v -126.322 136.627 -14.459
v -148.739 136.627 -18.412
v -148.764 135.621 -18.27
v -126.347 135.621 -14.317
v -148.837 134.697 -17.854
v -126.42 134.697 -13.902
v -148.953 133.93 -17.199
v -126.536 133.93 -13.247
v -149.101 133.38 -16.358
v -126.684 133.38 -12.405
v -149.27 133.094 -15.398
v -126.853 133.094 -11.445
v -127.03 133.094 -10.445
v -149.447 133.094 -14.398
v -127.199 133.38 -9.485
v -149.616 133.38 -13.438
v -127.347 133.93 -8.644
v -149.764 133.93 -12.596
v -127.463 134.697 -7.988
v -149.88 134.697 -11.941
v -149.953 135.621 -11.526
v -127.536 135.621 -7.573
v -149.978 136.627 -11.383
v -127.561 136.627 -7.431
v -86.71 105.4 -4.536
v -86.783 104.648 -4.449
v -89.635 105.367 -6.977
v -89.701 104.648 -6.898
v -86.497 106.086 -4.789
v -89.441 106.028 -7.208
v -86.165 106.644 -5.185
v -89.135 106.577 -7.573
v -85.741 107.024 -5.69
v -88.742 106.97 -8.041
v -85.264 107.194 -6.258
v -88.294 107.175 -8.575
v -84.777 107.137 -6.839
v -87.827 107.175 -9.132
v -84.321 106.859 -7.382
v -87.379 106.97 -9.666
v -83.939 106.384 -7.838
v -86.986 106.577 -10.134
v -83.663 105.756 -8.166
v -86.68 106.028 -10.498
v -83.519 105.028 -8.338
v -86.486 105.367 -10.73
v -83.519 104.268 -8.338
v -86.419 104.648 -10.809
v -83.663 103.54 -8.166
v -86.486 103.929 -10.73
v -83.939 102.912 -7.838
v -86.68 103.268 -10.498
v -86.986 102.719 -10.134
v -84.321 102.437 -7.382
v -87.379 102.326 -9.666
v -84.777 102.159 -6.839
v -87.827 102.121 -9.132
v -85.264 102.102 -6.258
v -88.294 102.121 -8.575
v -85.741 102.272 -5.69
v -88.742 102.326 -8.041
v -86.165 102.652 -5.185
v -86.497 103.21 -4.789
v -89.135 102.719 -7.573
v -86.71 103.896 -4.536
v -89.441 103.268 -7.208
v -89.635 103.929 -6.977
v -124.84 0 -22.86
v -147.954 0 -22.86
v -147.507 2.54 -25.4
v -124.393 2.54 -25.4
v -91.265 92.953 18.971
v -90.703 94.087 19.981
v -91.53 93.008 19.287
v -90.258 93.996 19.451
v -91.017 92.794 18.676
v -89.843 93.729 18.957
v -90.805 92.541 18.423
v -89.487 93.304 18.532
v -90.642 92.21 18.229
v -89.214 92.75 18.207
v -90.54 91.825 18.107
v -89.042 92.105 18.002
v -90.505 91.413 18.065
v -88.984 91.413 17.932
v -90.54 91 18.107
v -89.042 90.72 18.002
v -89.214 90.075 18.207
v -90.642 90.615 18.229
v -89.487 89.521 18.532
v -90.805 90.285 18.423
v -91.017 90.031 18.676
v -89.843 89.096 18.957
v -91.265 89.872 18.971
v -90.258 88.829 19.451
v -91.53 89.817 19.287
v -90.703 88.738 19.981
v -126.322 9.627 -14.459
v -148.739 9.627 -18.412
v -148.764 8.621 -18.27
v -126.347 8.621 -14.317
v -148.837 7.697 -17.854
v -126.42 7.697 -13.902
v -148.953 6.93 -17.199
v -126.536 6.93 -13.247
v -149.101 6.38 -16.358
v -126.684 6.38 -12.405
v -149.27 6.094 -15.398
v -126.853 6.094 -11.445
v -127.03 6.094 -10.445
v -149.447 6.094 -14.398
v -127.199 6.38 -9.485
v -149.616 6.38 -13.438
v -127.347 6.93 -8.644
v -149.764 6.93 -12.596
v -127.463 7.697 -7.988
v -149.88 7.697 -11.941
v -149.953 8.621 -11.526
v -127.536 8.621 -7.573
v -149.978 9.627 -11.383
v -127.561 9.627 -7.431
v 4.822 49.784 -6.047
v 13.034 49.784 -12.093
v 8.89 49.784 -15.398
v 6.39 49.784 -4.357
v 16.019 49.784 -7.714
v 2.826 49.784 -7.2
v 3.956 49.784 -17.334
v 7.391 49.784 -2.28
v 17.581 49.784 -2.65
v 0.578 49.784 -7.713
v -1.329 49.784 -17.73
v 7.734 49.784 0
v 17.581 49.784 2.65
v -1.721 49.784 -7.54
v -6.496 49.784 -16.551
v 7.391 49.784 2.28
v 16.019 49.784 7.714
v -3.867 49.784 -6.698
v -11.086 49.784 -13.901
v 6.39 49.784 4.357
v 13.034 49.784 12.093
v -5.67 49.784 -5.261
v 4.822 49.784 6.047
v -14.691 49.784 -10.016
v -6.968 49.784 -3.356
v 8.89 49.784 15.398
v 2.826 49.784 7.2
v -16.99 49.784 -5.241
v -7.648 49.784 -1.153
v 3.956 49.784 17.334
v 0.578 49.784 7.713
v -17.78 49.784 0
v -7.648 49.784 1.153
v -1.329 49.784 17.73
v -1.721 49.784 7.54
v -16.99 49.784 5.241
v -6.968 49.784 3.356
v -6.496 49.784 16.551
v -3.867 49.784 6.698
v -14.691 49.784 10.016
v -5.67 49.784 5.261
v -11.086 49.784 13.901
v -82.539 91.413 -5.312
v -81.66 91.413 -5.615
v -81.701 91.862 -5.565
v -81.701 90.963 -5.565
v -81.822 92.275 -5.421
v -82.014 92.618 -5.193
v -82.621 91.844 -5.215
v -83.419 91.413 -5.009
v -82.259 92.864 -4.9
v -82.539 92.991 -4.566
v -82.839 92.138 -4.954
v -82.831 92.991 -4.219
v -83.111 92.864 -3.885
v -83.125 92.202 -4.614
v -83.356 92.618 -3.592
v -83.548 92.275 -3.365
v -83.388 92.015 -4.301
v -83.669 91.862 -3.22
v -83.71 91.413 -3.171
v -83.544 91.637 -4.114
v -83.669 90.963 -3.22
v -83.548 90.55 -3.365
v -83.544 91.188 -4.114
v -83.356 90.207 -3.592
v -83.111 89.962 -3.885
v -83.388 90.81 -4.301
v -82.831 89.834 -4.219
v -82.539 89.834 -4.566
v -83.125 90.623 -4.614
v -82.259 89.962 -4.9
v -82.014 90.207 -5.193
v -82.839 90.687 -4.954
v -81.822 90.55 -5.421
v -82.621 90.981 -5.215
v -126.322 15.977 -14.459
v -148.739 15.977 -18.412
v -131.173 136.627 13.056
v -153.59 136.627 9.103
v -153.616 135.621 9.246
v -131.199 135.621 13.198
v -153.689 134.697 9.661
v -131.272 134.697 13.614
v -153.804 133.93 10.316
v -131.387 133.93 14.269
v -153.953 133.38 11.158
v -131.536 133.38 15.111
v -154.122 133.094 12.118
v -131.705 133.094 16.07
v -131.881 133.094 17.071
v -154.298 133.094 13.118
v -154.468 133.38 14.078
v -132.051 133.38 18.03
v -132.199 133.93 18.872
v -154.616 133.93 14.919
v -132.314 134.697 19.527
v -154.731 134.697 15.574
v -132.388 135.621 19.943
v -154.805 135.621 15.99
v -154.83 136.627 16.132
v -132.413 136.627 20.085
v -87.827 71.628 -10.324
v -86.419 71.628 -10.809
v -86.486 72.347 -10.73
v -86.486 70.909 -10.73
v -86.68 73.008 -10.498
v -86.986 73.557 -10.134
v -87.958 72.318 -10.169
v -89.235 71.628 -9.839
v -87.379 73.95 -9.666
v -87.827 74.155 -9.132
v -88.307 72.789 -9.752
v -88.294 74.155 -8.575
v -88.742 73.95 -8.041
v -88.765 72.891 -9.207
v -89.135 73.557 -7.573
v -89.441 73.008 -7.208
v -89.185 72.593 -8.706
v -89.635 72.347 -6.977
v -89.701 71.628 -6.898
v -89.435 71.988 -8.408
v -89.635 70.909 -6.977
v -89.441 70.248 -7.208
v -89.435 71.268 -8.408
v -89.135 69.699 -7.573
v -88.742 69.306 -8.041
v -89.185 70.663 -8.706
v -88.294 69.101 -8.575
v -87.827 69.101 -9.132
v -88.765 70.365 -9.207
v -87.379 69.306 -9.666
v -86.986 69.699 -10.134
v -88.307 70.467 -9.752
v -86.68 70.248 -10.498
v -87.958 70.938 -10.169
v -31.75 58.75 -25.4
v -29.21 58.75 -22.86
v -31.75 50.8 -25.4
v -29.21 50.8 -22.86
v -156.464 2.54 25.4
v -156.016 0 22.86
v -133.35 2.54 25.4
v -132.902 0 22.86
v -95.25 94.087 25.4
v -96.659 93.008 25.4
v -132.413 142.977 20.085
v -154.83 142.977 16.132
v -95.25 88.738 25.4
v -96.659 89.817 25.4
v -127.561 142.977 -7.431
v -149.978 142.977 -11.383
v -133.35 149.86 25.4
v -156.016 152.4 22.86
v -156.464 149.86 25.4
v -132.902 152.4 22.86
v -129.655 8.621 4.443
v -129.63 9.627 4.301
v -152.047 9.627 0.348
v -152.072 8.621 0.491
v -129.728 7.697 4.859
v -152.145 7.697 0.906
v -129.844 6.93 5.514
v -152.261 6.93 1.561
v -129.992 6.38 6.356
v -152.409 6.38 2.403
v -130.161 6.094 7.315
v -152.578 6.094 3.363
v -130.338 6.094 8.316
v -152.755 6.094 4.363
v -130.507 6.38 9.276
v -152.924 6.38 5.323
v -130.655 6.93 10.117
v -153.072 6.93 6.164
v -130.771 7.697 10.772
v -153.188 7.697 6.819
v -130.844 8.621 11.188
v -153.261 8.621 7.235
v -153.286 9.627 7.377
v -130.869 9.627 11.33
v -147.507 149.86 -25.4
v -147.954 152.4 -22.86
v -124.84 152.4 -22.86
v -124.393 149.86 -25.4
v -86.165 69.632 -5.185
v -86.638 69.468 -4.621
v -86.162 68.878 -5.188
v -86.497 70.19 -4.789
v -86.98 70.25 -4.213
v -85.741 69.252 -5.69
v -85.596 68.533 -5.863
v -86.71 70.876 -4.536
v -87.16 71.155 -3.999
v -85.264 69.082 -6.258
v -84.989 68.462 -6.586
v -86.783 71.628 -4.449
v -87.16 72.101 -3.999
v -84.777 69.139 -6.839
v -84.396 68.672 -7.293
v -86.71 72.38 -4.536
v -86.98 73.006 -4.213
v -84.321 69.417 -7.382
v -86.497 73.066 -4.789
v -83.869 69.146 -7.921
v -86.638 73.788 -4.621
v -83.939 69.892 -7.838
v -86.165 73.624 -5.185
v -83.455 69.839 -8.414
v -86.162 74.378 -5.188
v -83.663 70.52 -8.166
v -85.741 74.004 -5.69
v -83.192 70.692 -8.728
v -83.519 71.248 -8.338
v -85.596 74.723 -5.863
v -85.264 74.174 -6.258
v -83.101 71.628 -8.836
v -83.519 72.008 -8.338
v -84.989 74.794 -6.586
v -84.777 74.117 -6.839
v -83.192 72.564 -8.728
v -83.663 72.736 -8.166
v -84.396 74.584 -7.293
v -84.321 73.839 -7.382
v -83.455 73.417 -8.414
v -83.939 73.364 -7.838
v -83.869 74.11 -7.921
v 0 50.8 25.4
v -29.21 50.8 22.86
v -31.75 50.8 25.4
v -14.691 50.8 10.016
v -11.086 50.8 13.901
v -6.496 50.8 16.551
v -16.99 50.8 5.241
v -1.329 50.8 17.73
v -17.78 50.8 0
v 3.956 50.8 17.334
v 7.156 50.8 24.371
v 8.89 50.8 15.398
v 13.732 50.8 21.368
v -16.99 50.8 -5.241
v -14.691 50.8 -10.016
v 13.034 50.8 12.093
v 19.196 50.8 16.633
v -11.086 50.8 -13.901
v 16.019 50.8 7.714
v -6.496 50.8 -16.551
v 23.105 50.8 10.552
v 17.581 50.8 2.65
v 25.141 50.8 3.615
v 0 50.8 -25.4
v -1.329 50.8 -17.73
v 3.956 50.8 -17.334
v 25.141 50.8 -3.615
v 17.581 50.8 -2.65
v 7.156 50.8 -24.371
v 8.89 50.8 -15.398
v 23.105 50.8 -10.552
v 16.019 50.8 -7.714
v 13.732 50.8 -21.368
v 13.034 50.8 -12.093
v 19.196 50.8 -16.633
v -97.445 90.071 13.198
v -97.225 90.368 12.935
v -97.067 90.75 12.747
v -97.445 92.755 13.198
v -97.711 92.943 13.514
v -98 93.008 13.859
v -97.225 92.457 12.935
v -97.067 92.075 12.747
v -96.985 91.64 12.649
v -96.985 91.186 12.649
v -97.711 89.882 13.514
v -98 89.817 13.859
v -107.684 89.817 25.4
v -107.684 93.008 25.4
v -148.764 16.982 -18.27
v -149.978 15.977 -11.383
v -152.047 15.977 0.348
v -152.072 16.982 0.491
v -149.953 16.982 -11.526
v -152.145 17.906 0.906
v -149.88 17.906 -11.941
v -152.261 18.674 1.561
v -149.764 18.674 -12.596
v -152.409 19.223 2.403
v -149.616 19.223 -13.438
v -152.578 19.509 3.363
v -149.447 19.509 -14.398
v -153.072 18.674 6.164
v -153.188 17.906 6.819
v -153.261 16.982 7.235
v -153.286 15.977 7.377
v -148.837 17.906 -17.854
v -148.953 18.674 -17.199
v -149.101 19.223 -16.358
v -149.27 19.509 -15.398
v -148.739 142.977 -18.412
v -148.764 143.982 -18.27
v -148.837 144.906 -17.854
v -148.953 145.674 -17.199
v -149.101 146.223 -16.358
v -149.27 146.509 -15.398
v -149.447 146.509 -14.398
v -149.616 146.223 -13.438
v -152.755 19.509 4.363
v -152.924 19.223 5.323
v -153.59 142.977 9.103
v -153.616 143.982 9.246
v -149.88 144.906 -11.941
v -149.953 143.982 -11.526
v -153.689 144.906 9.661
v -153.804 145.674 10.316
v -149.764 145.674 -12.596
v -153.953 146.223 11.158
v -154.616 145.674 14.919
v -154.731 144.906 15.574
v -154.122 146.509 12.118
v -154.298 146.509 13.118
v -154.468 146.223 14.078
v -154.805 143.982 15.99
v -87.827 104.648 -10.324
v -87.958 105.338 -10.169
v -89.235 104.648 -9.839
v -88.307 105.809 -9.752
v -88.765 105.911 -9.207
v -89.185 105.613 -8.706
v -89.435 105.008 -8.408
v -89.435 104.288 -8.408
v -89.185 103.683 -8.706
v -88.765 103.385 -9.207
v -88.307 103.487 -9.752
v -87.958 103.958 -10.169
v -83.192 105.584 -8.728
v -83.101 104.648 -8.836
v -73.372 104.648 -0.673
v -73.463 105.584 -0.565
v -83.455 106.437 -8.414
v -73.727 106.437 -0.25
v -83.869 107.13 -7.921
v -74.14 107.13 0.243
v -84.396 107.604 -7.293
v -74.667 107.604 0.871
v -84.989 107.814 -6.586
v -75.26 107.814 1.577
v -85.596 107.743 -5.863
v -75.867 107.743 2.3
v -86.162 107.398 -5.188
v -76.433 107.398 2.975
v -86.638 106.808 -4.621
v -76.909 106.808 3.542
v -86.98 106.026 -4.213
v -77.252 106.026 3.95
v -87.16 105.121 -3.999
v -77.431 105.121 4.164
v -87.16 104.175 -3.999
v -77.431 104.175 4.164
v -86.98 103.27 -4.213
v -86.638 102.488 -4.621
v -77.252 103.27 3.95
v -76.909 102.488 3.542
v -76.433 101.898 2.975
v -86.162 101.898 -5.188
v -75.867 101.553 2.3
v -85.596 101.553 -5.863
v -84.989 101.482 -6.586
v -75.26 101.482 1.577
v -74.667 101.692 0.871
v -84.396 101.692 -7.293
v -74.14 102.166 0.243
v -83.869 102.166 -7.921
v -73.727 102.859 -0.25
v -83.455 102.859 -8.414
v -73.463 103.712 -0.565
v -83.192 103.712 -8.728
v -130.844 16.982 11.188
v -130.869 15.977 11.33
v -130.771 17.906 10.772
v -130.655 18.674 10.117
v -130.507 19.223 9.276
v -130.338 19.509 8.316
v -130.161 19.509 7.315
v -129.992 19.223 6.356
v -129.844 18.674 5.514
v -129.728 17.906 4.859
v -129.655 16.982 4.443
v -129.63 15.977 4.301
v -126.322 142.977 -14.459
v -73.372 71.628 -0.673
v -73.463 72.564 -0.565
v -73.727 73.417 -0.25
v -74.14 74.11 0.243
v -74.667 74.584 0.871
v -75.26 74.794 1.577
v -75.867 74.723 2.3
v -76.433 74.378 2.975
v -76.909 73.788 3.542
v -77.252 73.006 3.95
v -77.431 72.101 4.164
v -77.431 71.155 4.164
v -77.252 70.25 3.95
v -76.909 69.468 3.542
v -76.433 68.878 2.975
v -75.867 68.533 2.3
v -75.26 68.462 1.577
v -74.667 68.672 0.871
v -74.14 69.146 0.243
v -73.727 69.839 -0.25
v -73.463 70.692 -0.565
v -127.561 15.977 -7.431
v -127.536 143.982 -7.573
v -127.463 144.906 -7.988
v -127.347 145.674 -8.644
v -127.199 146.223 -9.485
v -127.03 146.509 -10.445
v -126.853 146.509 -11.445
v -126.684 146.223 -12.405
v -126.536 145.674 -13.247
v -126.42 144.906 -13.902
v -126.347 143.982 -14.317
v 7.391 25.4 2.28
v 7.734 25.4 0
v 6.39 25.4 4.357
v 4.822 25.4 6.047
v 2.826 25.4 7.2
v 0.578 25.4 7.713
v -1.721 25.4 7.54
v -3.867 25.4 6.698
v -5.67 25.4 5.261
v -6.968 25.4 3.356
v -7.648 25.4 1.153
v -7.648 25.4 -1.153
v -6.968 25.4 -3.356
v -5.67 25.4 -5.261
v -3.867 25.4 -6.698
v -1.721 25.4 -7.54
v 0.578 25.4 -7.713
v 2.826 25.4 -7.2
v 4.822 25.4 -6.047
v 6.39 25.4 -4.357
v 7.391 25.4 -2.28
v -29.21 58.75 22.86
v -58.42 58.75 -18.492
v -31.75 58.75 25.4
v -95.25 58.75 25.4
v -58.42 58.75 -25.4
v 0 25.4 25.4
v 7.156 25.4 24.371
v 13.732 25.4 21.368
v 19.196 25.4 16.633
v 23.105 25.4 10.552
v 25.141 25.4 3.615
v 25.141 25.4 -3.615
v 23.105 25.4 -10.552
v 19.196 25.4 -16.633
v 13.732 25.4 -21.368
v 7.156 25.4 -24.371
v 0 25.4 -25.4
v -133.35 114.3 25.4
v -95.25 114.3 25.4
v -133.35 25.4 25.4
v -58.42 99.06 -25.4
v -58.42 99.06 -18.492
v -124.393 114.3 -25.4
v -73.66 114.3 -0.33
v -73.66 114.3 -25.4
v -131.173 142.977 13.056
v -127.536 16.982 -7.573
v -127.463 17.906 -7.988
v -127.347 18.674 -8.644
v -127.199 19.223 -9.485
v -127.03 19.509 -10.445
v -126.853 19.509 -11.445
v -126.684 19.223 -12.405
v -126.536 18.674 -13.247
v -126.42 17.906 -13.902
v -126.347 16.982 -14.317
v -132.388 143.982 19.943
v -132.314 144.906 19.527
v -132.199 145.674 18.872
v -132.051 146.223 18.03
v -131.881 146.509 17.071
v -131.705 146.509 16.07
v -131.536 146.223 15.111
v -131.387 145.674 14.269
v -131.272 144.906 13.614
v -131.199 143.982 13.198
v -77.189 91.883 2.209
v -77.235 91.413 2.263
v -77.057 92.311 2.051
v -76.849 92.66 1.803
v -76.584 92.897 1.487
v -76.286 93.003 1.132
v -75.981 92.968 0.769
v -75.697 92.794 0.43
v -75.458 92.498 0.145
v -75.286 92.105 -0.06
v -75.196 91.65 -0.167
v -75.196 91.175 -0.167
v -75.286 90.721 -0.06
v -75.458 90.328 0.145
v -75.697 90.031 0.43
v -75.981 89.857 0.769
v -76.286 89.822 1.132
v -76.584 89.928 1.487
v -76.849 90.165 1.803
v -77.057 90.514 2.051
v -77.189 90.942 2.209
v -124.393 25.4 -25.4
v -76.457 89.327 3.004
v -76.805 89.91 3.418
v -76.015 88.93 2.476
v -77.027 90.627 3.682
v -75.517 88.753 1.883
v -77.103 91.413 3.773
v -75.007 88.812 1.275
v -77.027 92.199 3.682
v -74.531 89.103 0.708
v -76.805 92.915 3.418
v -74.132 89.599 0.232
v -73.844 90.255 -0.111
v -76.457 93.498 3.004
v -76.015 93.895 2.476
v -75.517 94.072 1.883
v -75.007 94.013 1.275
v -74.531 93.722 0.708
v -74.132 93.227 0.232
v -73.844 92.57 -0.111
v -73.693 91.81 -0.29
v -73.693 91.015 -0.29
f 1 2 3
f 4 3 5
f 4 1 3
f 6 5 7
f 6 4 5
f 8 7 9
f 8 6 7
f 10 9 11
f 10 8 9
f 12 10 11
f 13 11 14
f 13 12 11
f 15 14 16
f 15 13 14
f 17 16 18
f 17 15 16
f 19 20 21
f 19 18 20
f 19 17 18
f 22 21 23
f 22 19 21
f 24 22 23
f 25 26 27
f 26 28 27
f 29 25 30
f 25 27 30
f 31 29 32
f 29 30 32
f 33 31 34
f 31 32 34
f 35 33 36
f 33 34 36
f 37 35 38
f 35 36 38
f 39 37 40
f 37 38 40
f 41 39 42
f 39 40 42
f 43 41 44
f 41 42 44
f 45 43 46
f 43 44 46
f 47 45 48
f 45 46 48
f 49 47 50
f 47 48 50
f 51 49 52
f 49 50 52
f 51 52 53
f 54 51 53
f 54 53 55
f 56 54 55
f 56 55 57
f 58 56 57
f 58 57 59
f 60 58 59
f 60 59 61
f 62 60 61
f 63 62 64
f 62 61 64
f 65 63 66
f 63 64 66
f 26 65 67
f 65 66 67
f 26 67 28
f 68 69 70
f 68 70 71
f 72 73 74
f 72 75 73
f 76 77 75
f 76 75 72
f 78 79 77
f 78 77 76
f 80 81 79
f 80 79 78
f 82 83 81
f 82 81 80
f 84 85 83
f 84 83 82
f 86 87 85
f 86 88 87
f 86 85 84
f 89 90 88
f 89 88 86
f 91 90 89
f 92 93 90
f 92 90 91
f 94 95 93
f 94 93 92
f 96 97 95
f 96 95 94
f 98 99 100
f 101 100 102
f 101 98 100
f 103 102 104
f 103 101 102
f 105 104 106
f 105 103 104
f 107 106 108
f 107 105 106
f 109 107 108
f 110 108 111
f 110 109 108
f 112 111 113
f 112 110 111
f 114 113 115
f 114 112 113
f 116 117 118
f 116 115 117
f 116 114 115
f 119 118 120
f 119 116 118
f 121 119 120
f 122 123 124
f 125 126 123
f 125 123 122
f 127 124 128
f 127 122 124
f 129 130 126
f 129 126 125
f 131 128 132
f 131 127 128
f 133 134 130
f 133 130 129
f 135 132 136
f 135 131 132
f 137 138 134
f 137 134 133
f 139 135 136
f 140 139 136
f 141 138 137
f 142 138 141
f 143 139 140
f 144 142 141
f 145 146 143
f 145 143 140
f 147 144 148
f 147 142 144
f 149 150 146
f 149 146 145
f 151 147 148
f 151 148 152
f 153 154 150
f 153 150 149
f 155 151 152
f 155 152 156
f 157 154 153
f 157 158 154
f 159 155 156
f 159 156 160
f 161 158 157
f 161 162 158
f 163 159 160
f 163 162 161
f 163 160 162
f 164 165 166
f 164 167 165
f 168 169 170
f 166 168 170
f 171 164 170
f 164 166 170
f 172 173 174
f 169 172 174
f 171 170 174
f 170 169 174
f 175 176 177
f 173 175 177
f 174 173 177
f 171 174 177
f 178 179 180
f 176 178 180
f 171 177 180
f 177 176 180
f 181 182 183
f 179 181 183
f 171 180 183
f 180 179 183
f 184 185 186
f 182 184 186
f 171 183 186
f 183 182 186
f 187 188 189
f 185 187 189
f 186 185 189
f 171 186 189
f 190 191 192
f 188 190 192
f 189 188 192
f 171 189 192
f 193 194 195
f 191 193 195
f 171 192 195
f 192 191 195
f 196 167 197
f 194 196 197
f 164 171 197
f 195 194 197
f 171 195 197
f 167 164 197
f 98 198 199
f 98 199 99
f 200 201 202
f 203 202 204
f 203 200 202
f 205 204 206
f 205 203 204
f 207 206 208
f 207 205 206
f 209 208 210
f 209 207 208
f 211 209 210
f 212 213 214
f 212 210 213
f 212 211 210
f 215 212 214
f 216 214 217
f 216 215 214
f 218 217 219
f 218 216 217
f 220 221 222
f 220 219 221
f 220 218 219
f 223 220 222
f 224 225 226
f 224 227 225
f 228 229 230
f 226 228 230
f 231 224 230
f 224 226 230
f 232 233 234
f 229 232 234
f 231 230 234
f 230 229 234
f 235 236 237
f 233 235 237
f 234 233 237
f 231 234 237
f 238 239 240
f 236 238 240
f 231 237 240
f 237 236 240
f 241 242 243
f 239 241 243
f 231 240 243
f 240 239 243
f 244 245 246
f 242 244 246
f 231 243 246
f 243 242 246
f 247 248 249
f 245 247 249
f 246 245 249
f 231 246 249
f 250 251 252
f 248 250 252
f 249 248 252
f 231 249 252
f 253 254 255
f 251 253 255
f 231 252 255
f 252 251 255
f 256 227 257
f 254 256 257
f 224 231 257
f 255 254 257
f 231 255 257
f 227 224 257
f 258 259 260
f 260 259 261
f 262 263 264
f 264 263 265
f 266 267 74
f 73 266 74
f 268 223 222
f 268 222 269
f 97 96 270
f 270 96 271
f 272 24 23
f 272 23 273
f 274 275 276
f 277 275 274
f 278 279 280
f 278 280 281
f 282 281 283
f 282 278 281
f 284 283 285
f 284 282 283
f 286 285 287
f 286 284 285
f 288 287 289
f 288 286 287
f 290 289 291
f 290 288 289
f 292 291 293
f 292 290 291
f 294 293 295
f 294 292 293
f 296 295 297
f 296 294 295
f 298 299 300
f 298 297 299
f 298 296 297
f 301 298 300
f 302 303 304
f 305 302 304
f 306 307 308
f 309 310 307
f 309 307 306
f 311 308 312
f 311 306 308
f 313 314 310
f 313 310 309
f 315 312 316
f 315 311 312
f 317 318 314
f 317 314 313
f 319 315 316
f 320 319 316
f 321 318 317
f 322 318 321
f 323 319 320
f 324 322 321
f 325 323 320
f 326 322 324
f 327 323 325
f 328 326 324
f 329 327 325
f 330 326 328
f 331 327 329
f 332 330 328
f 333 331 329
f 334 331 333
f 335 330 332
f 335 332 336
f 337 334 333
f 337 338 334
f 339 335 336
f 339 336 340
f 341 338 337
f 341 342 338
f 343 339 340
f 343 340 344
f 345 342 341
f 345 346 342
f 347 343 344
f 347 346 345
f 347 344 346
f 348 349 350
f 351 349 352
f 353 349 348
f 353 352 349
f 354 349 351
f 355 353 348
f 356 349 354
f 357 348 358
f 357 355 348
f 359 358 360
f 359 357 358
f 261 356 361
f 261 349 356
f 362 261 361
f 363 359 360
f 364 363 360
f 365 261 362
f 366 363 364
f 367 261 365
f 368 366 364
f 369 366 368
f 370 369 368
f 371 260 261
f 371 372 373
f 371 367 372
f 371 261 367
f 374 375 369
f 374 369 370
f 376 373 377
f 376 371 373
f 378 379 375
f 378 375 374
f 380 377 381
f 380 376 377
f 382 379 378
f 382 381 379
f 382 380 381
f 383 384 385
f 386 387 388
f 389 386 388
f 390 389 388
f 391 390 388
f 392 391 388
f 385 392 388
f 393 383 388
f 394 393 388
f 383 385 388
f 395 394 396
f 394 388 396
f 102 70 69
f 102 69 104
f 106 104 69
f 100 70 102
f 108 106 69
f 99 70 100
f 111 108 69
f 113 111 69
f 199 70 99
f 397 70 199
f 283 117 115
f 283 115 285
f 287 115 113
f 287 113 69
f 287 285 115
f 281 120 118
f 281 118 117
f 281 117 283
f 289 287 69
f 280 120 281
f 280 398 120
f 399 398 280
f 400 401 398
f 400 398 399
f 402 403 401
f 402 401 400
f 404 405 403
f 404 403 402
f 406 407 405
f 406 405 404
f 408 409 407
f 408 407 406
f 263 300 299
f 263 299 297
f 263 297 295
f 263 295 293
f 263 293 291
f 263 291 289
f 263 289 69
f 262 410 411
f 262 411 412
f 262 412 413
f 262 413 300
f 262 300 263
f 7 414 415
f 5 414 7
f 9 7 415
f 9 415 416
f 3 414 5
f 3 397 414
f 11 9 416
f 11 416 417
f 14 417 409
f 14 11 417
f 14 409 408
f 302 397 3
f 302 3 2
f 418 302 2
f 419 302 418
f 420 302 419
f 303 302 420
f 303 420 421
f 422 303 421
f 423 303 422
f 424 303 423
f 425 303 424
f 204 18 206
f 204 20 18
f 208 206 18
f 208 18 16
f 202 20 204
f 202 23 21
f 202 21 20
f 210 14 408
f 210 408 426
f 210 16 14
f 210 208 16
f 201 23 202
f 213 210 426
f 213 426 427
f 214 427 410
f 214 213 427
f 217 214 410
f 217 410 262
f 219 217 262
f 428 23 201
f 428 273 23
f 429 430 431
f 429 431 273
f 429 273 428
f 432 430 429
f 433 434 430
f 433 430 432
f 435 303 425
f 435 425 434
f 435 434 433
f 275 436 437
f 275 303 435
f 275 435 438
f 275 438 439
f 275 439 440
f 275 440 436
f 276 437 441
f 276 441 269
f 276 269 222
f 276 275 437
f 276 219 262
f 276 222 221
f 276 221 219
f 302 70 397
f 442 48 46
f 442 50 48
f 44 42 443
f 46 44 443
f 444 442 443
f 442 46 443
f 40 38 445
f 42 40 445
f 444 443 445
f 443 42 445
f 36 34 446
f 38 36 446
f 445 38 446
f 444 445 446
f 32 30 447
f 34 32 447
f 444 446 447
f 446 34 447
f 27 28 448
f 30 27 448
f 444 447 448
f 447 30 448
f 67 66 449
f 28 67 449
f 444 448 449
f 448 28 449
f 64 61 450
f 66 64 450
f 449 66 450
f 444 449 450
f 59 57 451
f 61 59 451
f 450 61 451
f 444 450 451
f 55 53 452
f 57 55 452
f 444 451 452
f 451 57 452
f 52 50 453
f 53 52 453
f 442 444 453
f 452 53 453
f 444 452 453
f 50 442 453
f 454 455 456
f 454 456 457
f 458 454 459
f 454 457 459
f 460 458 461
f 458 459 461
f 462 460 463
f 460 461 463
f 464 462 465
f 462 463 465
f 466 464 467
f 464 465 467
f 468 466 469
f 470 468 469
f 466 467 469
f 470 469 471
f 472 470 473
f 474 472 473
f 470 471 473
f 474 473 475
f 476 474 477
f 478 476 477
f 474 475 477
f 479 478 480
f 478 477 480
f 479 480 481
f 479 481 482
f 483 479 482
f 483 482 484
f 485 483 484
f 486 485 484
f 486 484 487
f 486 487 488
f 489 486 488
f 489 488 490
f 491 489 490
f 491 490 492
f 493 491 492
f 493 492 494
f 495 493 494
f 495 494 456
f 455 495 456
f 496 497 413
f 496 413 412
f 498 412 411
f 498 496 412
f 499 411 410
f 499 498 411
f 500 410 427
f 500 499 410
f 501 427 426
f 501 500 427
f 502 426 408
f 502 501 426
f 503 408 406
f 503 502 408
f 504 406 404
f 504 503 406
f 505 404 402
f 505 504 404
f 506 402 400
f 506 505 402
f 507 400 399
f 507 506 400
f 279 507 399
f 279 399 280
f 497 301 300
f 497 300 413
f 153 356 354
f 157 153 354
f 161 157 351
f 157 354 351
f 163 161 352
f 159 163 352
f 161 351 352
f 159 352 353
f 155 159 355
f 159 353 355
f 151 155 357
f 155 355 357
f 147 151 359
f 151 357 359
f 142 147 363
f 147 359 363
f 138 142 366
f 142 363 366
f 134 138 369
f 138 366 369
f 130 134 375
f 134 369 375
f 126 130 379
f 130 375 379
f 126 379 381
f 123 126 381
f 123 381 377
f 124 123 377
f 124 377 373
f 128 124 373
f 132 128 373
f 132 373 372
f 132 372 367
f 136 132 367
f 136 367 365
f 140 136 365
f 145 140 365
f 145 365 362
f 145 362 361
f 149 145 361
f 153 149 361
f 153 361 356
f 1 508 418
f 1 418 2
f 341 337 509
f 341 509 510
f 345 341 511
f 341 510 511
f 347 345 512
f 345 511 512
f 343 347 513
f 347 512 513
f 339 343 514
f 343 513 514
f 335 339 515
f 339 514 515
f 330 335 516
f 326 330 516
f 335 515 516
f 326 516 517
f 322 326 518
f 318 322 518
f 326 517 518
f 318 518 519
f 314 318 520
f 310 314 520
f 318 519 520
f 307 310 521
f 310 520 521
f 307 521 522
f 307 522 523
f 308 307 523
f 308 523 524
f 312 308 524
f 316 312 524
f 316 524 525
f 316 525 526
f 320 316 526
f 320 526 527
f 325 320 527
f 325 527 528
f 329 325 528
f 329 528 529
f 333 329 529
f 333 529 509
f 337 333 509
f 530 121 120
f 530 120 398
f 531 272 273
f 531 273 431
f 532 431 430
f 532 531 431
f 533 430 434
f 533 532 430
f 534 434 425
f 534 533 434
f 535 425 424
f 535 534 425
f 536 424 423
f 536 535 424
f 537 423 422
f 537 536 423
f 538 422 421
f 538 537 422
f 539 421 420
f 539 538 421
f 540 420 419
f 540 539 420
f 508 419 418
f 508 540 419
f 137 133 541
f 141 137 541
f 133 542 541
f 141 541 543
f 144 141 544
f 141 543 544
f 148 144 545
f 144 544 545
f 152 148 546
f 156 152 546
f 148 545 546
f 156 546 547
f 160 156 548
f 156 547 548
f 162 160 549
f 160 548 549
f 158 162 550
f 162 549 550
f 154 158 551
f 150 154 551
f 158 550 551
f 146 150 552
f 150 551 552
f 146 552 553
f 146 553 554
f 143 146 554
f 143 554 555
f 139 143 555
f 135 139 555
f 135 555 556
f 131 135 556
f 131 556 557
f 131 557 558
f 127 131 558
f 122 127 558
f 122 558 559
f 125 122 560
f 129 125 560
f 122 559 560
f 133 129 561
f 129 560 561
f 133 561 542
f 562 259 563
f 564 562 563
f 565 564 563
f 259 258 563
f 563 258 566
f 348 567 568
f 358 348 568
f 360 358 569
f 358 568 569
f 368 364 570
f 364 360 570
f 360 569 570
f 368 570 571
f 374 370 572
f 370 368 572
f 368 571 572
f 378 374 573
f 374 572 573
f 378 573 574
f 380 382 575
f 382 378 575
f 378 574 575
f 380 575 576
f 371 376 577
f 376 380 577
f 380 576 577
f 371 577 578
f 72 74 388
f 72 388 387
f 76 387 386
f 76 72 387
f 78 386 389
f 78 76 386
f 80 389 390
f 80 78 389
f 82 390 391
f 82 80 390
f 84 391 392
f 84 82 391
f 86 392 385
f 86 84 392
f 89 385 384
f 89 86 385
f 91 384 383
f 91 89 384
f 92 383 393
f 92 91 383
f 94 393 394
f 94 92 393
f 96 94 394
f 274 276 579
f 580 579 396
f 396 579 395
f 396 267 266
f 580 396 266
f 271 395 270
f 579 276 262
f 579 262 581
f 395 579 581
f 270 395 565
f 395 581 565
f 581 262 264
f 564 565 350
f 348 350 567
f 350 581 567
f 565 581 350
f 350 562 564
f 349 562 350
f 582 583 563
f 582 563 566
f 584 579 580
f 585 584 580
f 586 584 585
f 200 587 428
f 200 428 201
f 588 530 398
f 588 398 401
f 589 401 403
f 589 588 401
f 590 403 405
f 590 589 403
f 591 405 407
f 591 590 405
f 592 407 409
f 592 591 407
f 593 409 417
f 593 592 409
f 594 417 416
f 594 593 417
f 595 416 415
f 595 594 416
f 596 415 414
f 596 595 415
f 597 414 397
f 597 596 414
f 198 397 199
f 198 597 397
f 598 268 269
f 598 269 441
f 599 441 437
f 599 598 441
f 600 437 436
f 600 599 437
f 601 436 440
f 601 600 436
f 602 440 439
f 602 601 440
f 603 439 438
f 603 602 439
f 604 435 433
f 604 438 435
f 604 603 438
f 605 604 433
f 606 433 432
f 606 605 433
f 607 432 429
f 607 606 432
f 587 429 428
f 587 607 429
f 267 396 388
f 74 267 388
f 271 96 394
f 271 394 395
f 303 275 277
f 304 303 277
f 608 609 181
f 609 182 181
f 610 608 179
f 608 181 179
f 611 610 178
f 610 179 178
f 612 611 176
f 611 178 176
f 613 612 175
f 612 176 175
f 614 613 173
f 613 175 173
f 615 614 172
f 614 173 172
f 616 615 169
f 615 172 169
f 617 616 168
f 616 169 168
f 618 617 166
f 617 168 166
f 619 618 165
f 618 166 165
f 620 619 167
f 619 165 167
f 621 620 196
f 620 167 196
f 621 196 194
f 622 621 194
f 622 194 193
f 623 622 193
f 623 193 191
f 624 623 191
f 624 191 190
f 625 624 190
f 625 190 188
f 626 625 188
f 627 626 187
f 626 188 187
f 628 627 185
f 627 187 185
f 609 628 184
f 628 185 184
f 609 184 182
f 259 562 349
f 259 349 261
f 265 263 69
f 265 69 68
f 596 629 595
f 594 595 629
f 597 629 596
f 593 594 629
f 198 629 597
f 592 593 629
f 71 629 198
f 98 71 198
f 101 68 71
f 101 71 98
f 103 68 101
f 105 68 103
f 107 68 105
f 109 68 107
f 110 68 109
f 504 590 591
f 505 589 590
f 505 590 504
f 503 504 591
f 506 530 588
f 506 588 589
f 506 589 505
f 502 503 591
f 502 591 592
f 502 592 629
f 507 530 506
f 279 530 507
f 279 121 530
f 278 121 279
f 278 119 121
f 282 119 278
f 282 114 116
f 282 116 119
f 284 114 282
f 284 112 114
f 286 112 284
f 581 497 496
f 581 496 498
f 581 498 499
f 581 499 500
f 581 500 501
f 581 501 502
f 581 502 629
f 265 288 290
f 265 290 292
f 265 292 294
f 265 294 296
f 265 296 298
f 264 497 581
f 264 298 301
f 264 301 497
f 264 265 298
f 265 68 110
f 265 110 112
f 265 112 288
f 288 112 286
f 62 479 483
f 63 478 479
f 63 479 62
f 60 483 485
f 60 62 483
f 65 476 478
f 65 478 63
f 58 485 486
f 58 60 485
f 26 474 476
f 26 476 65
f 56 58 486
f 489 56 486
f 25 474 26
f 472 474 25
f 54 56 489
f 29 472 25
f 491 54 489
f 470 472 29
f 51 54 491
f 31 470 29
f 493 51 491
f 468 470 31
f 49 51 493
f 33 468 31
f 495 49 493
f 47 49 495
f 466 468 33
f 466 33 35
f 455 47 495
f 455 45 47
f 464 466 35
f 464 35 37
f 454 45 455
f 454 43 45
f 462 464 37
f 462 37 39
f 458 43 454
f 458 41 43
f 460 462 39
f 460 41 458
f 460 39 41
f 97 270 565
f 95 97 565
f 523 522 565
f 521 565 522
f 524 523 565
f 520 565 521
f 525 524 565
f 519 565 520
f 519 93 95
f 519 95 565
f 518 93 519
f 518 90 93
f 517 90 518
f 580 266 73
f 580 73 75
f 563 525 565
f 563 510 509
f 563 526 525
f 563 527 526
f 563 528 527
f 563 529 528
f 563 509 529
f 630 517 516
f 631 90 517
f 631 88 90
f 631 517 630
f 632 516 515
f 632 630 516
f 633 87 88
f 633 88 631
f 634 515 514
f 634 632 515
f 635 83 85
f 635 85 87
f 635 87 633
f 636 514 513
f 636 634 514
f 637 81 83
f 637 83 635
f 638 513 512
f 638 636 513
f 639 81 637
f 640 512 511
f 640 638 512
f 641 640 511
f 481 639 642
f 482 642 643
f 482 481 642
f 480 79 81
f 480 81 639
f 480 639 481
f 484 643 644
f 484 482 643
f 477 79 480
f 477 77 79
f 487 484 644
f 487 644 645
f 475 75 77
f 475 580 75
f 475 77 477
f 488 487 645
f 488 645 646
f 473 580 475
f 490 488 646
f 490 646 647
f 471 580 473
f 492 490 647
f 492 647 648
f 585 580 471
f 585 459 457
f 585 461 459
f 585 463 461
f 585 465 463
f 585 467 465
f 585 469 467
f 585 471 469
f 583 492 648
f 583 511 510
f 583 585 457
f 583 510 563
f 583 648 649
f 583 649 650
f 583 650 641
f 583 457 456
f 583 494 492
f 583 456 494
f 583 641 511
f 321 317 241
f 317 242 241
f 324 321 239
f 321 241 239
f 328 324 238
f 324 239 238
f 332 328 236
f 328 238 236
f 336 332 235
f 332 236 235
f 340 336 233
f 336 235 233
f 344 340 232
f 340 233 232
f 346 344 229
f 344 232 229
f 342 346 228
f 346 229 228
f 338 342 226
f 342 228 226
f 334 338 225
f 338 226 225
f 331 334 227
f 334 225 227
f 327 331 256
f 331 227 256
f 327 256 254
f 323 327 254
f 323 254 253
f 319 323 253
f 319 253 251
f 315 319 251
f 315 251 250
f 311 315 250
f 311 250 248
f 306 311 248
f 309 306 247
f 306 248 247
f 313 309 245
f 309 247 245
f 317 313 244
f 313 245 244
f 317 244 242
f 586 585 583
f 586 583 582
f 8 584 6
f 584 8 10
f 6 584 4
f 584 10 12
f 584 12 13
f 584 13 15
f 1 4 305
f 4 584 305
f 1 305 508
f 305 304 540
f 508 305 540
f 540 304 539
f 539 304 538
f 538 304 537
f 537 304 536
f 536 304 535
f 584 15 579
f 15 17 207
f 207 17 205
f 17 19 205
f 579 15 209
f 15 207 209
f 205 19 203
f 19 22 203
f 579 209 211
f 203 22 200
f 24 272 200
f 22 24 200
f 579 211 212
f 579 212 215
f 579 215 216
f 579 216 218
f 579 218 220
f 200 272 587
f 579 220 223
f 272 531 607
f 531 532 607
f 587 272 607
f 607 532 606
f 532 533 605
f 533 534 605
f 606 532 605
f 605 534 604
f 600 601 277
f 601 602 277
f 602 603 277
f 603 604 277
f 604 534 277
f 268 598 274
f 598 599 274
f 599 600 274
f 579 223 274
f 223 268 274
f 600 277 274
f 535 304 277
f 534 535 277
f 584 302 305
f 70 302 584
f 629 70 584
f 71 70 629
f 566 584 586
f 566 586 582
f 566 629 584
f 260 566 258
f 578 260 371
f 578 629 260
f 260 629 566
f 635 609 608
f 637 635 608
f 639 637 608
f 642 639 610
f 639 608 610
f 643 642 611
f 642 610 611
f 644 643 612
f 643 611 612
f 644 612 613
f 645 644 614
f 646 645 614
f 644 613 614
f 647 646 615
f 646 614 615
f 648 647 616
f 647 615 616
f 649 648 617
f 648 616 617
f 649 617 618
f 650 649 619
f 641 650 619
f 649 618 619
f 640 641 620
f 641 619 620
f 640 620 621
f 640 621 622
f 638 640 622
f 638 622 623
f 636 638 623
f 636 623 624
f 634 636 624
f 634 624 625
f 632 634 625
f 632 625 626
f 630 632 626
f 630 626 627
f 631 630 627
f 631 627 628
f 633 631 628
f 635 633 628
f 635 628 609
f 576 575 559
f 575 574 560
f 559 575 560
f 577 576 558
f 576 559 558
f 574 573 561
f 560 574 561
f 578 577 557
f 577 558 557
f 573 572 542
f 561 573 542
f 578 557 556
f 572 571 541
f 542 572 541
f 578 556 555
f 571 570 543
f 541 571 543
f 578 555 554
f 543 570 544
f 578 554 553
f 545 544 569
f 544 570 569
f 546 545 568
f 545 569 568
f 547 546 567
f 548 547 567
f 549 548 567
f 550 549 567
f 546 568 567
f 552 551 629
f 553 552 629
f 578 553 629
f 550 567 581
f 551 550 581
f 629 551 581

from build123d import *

# Parameters (mm, degrees)
SKETCH1_W                              = 181.864
SKETCH1_H                              = 50.8
EXTRUDE1_DEPTH                         = 152.4
EXTRUDE2_DEPTH                         = 153.4
EXTRUDE3_DEPTH                         = 38.1
EXTRUDE4_DEPTH                         = 55.5498
SKETCH5_W                              = 54.61
SKETCH5_H                              = 50.8
EXTRUDE5_DEPTH                         = 7.9502
EXTRUDE6_DEPTH                         = 25.4
EXTRUDE7_DEPTH                         = 32.584173829
LPATTERN1_COUNT                        = 2
LPATTERN1_PITCH                        = 127
LPATTERN1_COUNT_DIR2                   = 2
LPATTERN1_PITCH_DIR2                   = 27.94
F_1_4_20_TAPPED_HOLE1_D                = 5.1054
F_1_4_20_TAPPED_HOLE1_DEPTH            = 16.51
F_1_4_20_TAPPED_HOLE1_CBORE_D          = 6.35
F_1_4_20_TAPPED_HOLE1_CBORE_DEPTH      = 12.7
F_1_4_20_TAPPED_HOLE1_TIP              = 1.533816902
EXTRUDE9_DEPTH                         = 128
CHAMFER1_SIZE                          = 2.54
CHAMFER2_SIZE                          = 15.24
EXTRUDE10_DEPTH                        = 32.584173829
SCREW_THRU_HOLE_AND_CBORE_D            = 15.4686
SCREW_THRU_HOLE_AND_CBORE_CBORE_D      = 35.56
SCREW_THRU_HOLE_AND_CBORE_CBORE_DEPTH  = 1.016
F_1_8_0_125_DIAMETER_HOLE1_D           = 3.19024
F_1_8_0_125_DIAMETER_HOLE1_DEPTH       = 9.525
F_1_8_0_125_DIAMETER_HOLE1_CSINK_D     = 5.334
F_1_8_0_125_DIAMETER_HOLE1_CSINK_ANGLE = 90
F_1_8_0_125_DIAMETER_HOLE1_TIP         = 0.958444791
CUT_EXTRUDE1_DEPTH                     = 9.525
CHAMFER3_SIZE                          = 1.0795


with BuildPart() as part:
    # Sketch1 → Extrude1 (new body)
    with BuildSketch(Plane(origin=(0, 0, 0), x_dir=(1, 0, 0), z_dir=(0, 1, 0))):
        with Locations((-65.532, 0)):
            Rectangle(SKETCH1_W, SKETCH1_H)
    extrude(amount=EXTRUDE1_DEPTH)

    # Sketch2 → Extrude2 (cut, through all)
    with BuildSketch(Plane(origin=(0, 152.4, 0), x_dir=(1, 0, 0), z_dir=(0, 1, 0))):
        Polygon((-156.464, -25.4), (-156.464, 25.4), (-147.50658938, 25.4), align=None)
    extrude(amount=-EXTRUDE2_DEPTH, mode=Mode.SUBTRACT)

    # Sketch3 → Extrude3 (cut)
    with BuildSketch(Plane(origin=(0, 152.4, 0), x_dir=(1, 0, 0), z_dir=(0, 1, 0))):
        Polygon((25.4, -25.4), (25.4, 25.4), (-124.39258938, 25.4), (-133.35, -25.4), align=None)
    extrude(amount=-EXTRUDE3_DEPTH, mode=Mode.SUBTRACT)

    # Sketch4 → Extrude4 (cut)
    with BuildSketch(Plane(origin=(0, 114.3, 0), x_dir=(1, 0, 0), z_dir=(0, 1, 0))):
        Polygon((25.4, -25.4), (-95.25, -25.4), (-58.42, 18.492284815), (-58.42, 25.4), (25.4, 25.4), align=None)
    extrude(amount=-EXTRUDE4_DEPTH, mode=Mode.SUBTRACT)

    # Sketch5 → Extrude5 (cut)
    with BuildSketch(Plane(origin=(0, 58.7502, 0), x_dir=(1, 0, 0), z_dir=(0, 1, 0))):
        with Locations((-1.905, 0)):
            Rectangle(SKETCH5_W, SKETCH5_H)
    extrude(amount=-EXTRUDE5_DEPTH, mode=Mode.SUBTRACT)

    # Sketch6 → Extrude6 (cut)
    with BuildSketch(Plane.XZ):
        Polygon((25.4, 25.4), (25.4, -25.4), (-124.39258938, -25.4), (-133.35, 25.4), align=None)
    extrude(amount=-EXTRUDE6_DEPTH, mode=Mode.SUBTRACT)

    # Sketch7 → Extrude7 (cut, through all)
    with BuildSketch(Plane(origin=(-124.985349671, 0, -22.03828934), x_dir=(0.173648178, 0, -0.984807753), z_dir=(0.984807753, 0, 0.173648178))):
        with BuildLine():
            Line((-35.635705397, 142.9766), (-35.635705397, 136.6266))
            ThreePointArc((-35.635705397, 136.6266), (-39.204405397, 133.0579), (-42.773105397, 136.6266))
            Line((-42.773105397, 136.6266), (-42.773105397, 142.9766))
            ThreePointArc((-42.773105397, 142.9766), (-39.204405397, 146.5453), (-35.635705397, 142.9766))
        make_face()
    extrude7 = extrude(amount=-EXTRUDE7_DEPTH, mode=Mode.SUBTRACT)

    # LPattern1: Extrude7 2 × 2, 1 skipped
    with Locations(*[Vector(0, -1, 0) * (i * LPATTERN1_PITCH) + Vector(0.173648178, 0, -0.984807753) * (j * LPATTERN1_PITCH_DIR2) for i in range(LPATTERN1_COUNT) for j in range(LPATTERN1_COUNT_DIR2) if (i, j) not in ((0, 0), (1, 0))]):
        add(extrude7, mode=Mode.SUBTRACT)

    # 1/4-20 Tapped Hole1
    with Locations(Plane(origin=(-43.387935998, 0, -36.406801094), x_dir=(0.64278761, 0, -0.766044443), z_dir=(0.766044443, 0, 0.64278761))):
        with Locations((-49.822048678, 104.648), (-49.822048678, 71.628)):
            CounterBoreHole(F_1_4_20_TAPPED_HOLE1_D / 2, F_1_4_20_TAPPED_HOLE1_CBORE_D / 2, F_1_4_20_TAPPED_HOLE1_CBORE_DEPTH, depth=F_1_4_20_TAPPED_HOLE1_DEPTH)
            with Locations((0, 0, -(F_1_4_20_TAPPED_HOLE1_DEPTH + F_1_4_20_TAPPED_HOLE1_TIP / 2))):  # 118° drill point
                Cone(0, F_1_4_20_TAPPED_HOLE1_D / 2, F_1_4_20_TAPPED_HOLE1_TIP, mode=Mode.SUBTRACT)

    # Sketch19 → Extrude9 (cut, through all)
    with BuildSketch(Plane.XZ.offset(-25.4)):
        with BuildLine():
            Line((27.94, 25.4), (0, 25.4))
            ThreePointArc((0, 25.4), (25.4, 0), (0, -25.4))
            Line((0, -25.4), (27.94, -25.4))
            Line((27.94, -25.4), (27.94, 25.4))
        make_face()
    extrude(amount=-EXTRUDE9_DEPTH, mode=Mode.SUBTRACT)

    # Chamfer1
    chamfer1_edges = [part.edges().sort_by_distance(p)[0] for p in [
        (-135.94958938, 152.4, -25.4),
        (-144.907, 0, 25.4),
        (-29.21, 54.7751, 25.4),
        (-29.21, 54.7751, -25.4),
        (-135.94958938, 0, -25.4),
        (-144.907, 152.4, 25.4),
    ]]
    chamfer(chamfer1_edges, length=CHAMFER1_SIZE)

    # Chamfer2
    chamfer2_edges = [part.edges().sort_by_distance(p)[0] for p in [
        (-58.42, 114.3, -21.946142408),
    ]]
    chamfer(chamfer2_edges, length=CHAMFER2_SIZE)

    # Sketch20 → Extrude10 (cut, through all)
    with BuildSketch(Plane(origin=(-124.985349671, 0, -22.03828934), x_dir=(0.173648178, 0, -0.984807753), z_dir=(0.984807753, 0, 0.173648178))):
        with BuildLine():
            Line((-26.745705397, 15.9766), (-26.745705397, 9.6266))
            ThreePointArc((-26.745705397, 9.6266), (-30.314405397, 6.0579), (-33.883105397, 9.6266))
            Line((-33.883105397, 9.6266), (-33.883105397, 15.9766))
            ThreePointArc((-33.883105397, 15.9766), (-30.314405397, 19.5453), (-26.745705397, 15.9766))
        make_face()
    extrude(amount=-EXTRUDE10_DEPTH, mode=Mode.SUBTRACT)

    # SCREW THRU HOLE AND CBORE (through all)
    with Locations(Plane(origin=(0, 50.8, 0), x_dir=(-1, 0, 0), z_dir=(0, 1, 0))):
        with Locations((0, 0)):
            CounterBoreHole(SCREW_THRU_HOLE_AND_CBORE_D / 2, SCREW_THRU_HOLE_AND_CBORE_CBORE_D / 2, SCREW_THRU_HOLE_AND_CBORE_CBORE_DEPTH)

    # 1/8 (0.125) Diameter Hole1
    with Locations(Plane(origin=(-43.387935998, 0, -36.406801094), x_dir=(0.64278761, 0, -0.766044443), z_dir=(0.766044443, 0, 0.64278761))):
        with Locations((-49.784, 91.412613047)):
            CounterSinkHole(F_1_8_0_125_DIAMETER_HOLE1_D / 2, F_1_8_0_125_DIAMETER_HOLE1_CSINK_D / 2, depth=F_1_8_0_125_DIAMETER_HOLE1_DEPTH, counter_sink_angle=F_1_8_0_125_DIAMETER_HOLE1_CSINK_ANGLE)
            with Locations((0, 0, -(F_1_8_0_125_DIAMETER_HOLE1_DEPTH + F_1_8_0_125_DIAMETER_HOLE1_TIP / 2))):  # 118° drill point
                Cone(0, F_1_8_0_125_DIAMETER_HOLE1_D / 2, F_1_8_0_125_DIAMETER_HOLE1_TIP, mode=Mode.SUBTRACT)

    # Sketch26 → Cut-Extrude1 (cut)
    with BuildSketch(Plane(origin=(-43.387935998, 0, -36.406801094), x_dir=(0.64278761, 0, -0.766044443), z_dir=(0.766044443, 0, 0.64278761))):
        with BuildLine():
            Line((-73.6092, 89.817493047), (-92.6592, 89.817493047))
            ThreePointArc((-92.6592, 89.817493047), (-94.25432, 91.412613047), (-92.6592, 93.007733047))
            Line((-92.6592, 93.007733047), (-73.6092, 93.007733047))
            ThreePointArc((-73.6092, 93.007733047), (-72.01408, 91.412613047), (-73.6092, 89.817493047))
        make_face()
    extrude(amount=-CUT_EXTRUDE1_DEPTH, mode=Mode.SUBTRACT)

    # Chamfer3
    chamfer3_edges = [part.edges().sort_by_distance(p)[0] for p in [
        (-92.976508859, 89.817493047, 22.690558764),
        (-92.976508859, 93.007733047, 22.690558764),
        (-89.677694345, 91.412613047, 18.759184717),
    ]]
    chamfer(chamfer3_edges, length=CHAMFER3_SIZE)


solid = part.part
